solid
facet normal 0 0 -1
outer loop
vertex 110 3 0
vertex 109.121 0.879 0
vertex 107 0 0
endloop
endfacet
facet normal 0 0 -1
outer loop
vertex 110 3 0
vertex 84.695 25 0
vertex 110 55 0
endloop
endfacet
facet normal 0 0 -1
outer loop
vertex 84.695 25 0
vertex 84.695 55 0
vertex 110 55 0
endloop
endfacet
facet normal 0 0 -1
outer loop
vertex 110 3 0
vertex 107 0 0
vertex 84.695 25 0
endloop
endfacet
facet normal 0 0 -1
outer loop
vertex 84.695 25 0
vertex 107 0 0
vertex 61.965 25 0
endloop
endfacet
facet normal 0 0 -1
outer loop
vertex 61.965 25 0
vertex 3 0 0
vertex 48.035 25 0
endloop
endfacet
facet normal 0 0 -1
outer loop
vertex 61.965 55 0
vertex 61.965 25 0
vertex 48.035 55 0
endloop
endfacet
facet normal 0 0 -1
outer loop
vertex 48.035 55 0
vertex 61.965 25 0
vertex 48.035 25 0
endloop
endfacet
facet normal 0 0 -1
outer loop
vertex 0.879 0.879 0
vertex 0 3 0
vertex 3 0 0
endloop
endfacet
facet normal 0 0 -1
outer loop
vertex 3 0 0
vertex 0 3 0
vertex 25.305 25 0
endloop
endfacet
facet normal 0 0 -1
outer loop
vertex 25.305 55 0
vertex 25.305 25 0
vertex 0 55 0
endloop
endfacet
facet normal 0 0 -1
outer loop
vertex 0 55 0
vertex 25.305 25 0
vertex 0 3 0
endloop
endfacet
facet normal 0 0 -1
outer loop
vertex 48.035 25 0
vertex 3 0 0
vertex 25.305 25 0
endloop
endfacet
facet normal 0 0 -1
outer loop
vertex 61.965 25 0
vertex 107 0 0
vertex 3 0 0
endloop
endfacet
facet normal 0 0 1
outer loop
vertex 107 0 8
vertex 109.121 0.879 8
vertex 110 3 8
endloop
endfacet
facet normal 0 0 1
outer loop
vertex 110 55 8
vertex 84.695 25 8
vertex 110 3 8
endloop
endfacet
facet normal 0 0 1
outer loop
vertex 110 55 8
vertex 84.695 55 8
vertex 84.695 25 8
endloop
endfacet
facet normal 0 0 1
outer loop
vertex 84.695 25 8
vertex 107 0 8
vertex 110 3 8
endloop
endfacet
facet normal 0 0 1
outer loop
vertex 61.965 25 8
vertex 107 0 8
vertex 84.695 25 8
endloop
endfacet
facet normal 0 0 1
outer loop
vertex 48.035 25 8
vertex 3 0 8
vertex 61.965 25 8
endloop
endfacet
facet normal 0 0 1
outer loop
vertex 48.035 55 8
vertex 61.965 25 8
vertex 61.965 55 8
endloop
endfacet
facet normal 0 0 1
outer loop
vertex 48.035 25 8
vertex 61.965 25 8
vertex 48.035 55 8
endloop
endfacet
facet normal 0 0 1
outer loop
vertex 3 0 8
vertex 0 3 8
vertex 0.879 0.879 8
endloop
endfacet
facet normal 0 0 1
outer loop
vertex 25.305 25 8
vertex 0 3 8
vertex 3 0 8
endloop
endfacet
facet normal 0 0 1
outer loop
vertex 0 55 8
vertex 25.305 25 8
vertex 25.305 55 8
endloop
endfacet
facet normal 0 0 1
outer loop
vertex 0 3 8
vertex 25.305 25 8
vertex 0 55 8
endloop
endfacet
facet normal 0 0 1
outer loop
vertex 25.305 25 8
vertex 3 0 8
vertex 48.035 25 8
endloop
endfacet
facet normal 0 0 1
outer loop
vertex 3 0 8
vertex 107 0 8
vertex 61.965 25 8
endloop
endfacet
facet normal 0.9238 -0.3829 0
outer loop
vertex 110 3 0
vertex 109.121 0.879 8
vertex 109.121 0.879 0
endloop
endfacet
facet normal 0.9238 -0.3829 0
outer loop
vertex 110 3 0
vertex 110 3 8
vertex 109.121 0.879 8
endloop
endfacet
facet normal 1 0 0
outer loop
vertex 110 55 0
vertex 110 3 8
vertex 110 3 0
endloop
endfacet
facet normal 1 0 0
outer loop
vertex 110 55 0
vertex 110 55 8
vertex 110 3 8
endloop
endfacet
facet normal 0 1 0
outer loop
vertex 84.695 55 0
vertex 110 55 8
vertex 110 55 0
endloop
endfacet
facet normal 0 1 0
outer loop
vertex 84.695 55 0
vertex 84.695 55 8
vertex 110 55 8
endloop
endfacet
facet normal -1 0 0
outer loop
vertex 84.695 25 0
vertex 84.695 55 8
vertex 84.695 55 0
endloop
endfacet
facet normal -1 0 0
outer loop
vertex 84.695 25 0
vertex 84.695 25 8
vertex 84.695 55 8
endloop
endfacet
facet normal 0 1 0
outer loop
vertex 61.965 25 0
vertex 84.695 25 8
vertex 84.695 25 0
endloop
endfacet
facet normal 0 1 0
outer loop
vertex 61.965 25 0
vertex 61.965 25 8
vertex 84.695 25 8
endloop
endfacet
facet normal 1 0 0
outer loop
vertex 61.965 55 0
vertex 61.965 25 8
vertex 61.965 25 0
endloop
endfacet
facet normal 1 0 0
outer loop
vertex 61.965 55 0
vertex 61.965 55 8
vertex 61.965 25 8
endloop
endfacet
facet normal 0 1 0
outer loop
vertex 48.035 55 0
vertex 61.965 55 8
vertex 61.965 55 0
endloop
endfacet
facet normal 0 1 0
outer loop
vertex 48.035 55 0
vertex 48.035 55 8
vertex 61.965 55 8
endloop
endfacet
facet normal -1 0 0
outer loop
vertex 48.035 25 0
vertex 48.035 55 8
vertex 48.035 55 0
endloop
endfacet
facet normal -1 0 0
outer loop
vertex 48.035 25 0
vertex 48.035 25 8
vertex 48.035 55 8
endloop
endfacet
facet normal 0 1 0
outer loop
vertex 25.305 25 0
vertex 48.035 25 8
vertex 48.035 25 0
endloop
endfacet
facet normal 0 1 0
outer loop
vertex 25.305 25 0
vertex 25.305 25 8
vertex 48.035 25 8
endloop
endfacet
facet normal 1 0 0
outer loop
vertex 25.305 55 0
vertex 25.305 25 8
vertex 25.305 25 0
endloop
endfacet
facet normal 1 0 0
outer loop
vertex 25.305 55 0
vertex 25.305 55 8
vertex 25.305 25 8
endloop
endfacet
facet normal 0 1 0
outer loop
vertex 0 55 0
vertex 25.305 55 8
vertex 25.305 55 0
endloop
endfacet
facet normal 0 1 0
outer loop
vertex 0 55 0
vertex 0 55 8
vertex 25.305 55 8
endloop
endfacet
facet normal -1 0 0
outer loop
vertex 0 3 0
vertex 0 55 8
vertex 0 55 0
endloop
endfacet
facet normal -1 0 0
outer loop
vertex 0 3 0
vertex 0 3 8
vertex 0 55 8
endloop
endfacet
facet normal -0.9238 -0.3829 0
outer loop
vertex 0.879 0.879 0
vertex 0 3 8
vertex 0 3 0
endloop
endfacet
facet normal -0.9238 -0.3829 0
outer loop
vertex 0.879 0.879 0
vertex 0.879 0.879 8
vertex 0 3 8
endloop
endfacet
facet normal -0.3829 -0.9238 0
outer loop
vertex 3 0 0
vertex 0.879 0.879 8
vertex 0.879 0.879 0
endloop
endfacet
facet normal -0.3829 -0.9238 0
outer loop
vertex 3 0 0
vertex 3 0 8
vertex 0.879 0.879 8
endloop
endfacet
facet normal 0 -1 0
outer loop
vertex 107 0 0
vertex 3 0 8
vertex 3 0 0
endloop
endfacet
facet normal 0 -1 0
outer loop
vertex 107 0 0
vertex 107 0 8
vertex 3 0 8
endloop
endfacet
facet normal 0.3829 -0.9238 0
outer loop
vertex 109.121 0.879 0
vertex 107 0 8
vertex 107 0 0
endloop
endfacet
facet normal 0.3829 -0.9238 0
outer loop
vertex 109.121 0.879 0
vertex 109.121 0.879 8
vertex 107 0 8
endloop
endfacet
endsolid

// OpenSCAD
$fn = 32;

// ----------------------------------------------------------------------
// Window plate: 110 x 55 mm, 2 open windows
// ----------------------------------------------------------------------

// --- parameters (mm) ---
profile_height = 8;       // extrusion height
profile_points = 16;      // points of the closed outline

profile = [[0, 3], [0.879, 0.879], [3, 0], [107, 0], [109.121, 0.879], [110, 3], [110, 55], [84.695, 55], [84.695, 25], [61.965, 25], [61.965, 55], [48.035, 55], [48.035, 25], [25.305, 25], [25.305, 55], [0, 55]];  // single closed polygon, 16 points, counter clockwise

// --- the one profile operation ---
linear_extrude(height = profile_height) polygon(points = profile);
